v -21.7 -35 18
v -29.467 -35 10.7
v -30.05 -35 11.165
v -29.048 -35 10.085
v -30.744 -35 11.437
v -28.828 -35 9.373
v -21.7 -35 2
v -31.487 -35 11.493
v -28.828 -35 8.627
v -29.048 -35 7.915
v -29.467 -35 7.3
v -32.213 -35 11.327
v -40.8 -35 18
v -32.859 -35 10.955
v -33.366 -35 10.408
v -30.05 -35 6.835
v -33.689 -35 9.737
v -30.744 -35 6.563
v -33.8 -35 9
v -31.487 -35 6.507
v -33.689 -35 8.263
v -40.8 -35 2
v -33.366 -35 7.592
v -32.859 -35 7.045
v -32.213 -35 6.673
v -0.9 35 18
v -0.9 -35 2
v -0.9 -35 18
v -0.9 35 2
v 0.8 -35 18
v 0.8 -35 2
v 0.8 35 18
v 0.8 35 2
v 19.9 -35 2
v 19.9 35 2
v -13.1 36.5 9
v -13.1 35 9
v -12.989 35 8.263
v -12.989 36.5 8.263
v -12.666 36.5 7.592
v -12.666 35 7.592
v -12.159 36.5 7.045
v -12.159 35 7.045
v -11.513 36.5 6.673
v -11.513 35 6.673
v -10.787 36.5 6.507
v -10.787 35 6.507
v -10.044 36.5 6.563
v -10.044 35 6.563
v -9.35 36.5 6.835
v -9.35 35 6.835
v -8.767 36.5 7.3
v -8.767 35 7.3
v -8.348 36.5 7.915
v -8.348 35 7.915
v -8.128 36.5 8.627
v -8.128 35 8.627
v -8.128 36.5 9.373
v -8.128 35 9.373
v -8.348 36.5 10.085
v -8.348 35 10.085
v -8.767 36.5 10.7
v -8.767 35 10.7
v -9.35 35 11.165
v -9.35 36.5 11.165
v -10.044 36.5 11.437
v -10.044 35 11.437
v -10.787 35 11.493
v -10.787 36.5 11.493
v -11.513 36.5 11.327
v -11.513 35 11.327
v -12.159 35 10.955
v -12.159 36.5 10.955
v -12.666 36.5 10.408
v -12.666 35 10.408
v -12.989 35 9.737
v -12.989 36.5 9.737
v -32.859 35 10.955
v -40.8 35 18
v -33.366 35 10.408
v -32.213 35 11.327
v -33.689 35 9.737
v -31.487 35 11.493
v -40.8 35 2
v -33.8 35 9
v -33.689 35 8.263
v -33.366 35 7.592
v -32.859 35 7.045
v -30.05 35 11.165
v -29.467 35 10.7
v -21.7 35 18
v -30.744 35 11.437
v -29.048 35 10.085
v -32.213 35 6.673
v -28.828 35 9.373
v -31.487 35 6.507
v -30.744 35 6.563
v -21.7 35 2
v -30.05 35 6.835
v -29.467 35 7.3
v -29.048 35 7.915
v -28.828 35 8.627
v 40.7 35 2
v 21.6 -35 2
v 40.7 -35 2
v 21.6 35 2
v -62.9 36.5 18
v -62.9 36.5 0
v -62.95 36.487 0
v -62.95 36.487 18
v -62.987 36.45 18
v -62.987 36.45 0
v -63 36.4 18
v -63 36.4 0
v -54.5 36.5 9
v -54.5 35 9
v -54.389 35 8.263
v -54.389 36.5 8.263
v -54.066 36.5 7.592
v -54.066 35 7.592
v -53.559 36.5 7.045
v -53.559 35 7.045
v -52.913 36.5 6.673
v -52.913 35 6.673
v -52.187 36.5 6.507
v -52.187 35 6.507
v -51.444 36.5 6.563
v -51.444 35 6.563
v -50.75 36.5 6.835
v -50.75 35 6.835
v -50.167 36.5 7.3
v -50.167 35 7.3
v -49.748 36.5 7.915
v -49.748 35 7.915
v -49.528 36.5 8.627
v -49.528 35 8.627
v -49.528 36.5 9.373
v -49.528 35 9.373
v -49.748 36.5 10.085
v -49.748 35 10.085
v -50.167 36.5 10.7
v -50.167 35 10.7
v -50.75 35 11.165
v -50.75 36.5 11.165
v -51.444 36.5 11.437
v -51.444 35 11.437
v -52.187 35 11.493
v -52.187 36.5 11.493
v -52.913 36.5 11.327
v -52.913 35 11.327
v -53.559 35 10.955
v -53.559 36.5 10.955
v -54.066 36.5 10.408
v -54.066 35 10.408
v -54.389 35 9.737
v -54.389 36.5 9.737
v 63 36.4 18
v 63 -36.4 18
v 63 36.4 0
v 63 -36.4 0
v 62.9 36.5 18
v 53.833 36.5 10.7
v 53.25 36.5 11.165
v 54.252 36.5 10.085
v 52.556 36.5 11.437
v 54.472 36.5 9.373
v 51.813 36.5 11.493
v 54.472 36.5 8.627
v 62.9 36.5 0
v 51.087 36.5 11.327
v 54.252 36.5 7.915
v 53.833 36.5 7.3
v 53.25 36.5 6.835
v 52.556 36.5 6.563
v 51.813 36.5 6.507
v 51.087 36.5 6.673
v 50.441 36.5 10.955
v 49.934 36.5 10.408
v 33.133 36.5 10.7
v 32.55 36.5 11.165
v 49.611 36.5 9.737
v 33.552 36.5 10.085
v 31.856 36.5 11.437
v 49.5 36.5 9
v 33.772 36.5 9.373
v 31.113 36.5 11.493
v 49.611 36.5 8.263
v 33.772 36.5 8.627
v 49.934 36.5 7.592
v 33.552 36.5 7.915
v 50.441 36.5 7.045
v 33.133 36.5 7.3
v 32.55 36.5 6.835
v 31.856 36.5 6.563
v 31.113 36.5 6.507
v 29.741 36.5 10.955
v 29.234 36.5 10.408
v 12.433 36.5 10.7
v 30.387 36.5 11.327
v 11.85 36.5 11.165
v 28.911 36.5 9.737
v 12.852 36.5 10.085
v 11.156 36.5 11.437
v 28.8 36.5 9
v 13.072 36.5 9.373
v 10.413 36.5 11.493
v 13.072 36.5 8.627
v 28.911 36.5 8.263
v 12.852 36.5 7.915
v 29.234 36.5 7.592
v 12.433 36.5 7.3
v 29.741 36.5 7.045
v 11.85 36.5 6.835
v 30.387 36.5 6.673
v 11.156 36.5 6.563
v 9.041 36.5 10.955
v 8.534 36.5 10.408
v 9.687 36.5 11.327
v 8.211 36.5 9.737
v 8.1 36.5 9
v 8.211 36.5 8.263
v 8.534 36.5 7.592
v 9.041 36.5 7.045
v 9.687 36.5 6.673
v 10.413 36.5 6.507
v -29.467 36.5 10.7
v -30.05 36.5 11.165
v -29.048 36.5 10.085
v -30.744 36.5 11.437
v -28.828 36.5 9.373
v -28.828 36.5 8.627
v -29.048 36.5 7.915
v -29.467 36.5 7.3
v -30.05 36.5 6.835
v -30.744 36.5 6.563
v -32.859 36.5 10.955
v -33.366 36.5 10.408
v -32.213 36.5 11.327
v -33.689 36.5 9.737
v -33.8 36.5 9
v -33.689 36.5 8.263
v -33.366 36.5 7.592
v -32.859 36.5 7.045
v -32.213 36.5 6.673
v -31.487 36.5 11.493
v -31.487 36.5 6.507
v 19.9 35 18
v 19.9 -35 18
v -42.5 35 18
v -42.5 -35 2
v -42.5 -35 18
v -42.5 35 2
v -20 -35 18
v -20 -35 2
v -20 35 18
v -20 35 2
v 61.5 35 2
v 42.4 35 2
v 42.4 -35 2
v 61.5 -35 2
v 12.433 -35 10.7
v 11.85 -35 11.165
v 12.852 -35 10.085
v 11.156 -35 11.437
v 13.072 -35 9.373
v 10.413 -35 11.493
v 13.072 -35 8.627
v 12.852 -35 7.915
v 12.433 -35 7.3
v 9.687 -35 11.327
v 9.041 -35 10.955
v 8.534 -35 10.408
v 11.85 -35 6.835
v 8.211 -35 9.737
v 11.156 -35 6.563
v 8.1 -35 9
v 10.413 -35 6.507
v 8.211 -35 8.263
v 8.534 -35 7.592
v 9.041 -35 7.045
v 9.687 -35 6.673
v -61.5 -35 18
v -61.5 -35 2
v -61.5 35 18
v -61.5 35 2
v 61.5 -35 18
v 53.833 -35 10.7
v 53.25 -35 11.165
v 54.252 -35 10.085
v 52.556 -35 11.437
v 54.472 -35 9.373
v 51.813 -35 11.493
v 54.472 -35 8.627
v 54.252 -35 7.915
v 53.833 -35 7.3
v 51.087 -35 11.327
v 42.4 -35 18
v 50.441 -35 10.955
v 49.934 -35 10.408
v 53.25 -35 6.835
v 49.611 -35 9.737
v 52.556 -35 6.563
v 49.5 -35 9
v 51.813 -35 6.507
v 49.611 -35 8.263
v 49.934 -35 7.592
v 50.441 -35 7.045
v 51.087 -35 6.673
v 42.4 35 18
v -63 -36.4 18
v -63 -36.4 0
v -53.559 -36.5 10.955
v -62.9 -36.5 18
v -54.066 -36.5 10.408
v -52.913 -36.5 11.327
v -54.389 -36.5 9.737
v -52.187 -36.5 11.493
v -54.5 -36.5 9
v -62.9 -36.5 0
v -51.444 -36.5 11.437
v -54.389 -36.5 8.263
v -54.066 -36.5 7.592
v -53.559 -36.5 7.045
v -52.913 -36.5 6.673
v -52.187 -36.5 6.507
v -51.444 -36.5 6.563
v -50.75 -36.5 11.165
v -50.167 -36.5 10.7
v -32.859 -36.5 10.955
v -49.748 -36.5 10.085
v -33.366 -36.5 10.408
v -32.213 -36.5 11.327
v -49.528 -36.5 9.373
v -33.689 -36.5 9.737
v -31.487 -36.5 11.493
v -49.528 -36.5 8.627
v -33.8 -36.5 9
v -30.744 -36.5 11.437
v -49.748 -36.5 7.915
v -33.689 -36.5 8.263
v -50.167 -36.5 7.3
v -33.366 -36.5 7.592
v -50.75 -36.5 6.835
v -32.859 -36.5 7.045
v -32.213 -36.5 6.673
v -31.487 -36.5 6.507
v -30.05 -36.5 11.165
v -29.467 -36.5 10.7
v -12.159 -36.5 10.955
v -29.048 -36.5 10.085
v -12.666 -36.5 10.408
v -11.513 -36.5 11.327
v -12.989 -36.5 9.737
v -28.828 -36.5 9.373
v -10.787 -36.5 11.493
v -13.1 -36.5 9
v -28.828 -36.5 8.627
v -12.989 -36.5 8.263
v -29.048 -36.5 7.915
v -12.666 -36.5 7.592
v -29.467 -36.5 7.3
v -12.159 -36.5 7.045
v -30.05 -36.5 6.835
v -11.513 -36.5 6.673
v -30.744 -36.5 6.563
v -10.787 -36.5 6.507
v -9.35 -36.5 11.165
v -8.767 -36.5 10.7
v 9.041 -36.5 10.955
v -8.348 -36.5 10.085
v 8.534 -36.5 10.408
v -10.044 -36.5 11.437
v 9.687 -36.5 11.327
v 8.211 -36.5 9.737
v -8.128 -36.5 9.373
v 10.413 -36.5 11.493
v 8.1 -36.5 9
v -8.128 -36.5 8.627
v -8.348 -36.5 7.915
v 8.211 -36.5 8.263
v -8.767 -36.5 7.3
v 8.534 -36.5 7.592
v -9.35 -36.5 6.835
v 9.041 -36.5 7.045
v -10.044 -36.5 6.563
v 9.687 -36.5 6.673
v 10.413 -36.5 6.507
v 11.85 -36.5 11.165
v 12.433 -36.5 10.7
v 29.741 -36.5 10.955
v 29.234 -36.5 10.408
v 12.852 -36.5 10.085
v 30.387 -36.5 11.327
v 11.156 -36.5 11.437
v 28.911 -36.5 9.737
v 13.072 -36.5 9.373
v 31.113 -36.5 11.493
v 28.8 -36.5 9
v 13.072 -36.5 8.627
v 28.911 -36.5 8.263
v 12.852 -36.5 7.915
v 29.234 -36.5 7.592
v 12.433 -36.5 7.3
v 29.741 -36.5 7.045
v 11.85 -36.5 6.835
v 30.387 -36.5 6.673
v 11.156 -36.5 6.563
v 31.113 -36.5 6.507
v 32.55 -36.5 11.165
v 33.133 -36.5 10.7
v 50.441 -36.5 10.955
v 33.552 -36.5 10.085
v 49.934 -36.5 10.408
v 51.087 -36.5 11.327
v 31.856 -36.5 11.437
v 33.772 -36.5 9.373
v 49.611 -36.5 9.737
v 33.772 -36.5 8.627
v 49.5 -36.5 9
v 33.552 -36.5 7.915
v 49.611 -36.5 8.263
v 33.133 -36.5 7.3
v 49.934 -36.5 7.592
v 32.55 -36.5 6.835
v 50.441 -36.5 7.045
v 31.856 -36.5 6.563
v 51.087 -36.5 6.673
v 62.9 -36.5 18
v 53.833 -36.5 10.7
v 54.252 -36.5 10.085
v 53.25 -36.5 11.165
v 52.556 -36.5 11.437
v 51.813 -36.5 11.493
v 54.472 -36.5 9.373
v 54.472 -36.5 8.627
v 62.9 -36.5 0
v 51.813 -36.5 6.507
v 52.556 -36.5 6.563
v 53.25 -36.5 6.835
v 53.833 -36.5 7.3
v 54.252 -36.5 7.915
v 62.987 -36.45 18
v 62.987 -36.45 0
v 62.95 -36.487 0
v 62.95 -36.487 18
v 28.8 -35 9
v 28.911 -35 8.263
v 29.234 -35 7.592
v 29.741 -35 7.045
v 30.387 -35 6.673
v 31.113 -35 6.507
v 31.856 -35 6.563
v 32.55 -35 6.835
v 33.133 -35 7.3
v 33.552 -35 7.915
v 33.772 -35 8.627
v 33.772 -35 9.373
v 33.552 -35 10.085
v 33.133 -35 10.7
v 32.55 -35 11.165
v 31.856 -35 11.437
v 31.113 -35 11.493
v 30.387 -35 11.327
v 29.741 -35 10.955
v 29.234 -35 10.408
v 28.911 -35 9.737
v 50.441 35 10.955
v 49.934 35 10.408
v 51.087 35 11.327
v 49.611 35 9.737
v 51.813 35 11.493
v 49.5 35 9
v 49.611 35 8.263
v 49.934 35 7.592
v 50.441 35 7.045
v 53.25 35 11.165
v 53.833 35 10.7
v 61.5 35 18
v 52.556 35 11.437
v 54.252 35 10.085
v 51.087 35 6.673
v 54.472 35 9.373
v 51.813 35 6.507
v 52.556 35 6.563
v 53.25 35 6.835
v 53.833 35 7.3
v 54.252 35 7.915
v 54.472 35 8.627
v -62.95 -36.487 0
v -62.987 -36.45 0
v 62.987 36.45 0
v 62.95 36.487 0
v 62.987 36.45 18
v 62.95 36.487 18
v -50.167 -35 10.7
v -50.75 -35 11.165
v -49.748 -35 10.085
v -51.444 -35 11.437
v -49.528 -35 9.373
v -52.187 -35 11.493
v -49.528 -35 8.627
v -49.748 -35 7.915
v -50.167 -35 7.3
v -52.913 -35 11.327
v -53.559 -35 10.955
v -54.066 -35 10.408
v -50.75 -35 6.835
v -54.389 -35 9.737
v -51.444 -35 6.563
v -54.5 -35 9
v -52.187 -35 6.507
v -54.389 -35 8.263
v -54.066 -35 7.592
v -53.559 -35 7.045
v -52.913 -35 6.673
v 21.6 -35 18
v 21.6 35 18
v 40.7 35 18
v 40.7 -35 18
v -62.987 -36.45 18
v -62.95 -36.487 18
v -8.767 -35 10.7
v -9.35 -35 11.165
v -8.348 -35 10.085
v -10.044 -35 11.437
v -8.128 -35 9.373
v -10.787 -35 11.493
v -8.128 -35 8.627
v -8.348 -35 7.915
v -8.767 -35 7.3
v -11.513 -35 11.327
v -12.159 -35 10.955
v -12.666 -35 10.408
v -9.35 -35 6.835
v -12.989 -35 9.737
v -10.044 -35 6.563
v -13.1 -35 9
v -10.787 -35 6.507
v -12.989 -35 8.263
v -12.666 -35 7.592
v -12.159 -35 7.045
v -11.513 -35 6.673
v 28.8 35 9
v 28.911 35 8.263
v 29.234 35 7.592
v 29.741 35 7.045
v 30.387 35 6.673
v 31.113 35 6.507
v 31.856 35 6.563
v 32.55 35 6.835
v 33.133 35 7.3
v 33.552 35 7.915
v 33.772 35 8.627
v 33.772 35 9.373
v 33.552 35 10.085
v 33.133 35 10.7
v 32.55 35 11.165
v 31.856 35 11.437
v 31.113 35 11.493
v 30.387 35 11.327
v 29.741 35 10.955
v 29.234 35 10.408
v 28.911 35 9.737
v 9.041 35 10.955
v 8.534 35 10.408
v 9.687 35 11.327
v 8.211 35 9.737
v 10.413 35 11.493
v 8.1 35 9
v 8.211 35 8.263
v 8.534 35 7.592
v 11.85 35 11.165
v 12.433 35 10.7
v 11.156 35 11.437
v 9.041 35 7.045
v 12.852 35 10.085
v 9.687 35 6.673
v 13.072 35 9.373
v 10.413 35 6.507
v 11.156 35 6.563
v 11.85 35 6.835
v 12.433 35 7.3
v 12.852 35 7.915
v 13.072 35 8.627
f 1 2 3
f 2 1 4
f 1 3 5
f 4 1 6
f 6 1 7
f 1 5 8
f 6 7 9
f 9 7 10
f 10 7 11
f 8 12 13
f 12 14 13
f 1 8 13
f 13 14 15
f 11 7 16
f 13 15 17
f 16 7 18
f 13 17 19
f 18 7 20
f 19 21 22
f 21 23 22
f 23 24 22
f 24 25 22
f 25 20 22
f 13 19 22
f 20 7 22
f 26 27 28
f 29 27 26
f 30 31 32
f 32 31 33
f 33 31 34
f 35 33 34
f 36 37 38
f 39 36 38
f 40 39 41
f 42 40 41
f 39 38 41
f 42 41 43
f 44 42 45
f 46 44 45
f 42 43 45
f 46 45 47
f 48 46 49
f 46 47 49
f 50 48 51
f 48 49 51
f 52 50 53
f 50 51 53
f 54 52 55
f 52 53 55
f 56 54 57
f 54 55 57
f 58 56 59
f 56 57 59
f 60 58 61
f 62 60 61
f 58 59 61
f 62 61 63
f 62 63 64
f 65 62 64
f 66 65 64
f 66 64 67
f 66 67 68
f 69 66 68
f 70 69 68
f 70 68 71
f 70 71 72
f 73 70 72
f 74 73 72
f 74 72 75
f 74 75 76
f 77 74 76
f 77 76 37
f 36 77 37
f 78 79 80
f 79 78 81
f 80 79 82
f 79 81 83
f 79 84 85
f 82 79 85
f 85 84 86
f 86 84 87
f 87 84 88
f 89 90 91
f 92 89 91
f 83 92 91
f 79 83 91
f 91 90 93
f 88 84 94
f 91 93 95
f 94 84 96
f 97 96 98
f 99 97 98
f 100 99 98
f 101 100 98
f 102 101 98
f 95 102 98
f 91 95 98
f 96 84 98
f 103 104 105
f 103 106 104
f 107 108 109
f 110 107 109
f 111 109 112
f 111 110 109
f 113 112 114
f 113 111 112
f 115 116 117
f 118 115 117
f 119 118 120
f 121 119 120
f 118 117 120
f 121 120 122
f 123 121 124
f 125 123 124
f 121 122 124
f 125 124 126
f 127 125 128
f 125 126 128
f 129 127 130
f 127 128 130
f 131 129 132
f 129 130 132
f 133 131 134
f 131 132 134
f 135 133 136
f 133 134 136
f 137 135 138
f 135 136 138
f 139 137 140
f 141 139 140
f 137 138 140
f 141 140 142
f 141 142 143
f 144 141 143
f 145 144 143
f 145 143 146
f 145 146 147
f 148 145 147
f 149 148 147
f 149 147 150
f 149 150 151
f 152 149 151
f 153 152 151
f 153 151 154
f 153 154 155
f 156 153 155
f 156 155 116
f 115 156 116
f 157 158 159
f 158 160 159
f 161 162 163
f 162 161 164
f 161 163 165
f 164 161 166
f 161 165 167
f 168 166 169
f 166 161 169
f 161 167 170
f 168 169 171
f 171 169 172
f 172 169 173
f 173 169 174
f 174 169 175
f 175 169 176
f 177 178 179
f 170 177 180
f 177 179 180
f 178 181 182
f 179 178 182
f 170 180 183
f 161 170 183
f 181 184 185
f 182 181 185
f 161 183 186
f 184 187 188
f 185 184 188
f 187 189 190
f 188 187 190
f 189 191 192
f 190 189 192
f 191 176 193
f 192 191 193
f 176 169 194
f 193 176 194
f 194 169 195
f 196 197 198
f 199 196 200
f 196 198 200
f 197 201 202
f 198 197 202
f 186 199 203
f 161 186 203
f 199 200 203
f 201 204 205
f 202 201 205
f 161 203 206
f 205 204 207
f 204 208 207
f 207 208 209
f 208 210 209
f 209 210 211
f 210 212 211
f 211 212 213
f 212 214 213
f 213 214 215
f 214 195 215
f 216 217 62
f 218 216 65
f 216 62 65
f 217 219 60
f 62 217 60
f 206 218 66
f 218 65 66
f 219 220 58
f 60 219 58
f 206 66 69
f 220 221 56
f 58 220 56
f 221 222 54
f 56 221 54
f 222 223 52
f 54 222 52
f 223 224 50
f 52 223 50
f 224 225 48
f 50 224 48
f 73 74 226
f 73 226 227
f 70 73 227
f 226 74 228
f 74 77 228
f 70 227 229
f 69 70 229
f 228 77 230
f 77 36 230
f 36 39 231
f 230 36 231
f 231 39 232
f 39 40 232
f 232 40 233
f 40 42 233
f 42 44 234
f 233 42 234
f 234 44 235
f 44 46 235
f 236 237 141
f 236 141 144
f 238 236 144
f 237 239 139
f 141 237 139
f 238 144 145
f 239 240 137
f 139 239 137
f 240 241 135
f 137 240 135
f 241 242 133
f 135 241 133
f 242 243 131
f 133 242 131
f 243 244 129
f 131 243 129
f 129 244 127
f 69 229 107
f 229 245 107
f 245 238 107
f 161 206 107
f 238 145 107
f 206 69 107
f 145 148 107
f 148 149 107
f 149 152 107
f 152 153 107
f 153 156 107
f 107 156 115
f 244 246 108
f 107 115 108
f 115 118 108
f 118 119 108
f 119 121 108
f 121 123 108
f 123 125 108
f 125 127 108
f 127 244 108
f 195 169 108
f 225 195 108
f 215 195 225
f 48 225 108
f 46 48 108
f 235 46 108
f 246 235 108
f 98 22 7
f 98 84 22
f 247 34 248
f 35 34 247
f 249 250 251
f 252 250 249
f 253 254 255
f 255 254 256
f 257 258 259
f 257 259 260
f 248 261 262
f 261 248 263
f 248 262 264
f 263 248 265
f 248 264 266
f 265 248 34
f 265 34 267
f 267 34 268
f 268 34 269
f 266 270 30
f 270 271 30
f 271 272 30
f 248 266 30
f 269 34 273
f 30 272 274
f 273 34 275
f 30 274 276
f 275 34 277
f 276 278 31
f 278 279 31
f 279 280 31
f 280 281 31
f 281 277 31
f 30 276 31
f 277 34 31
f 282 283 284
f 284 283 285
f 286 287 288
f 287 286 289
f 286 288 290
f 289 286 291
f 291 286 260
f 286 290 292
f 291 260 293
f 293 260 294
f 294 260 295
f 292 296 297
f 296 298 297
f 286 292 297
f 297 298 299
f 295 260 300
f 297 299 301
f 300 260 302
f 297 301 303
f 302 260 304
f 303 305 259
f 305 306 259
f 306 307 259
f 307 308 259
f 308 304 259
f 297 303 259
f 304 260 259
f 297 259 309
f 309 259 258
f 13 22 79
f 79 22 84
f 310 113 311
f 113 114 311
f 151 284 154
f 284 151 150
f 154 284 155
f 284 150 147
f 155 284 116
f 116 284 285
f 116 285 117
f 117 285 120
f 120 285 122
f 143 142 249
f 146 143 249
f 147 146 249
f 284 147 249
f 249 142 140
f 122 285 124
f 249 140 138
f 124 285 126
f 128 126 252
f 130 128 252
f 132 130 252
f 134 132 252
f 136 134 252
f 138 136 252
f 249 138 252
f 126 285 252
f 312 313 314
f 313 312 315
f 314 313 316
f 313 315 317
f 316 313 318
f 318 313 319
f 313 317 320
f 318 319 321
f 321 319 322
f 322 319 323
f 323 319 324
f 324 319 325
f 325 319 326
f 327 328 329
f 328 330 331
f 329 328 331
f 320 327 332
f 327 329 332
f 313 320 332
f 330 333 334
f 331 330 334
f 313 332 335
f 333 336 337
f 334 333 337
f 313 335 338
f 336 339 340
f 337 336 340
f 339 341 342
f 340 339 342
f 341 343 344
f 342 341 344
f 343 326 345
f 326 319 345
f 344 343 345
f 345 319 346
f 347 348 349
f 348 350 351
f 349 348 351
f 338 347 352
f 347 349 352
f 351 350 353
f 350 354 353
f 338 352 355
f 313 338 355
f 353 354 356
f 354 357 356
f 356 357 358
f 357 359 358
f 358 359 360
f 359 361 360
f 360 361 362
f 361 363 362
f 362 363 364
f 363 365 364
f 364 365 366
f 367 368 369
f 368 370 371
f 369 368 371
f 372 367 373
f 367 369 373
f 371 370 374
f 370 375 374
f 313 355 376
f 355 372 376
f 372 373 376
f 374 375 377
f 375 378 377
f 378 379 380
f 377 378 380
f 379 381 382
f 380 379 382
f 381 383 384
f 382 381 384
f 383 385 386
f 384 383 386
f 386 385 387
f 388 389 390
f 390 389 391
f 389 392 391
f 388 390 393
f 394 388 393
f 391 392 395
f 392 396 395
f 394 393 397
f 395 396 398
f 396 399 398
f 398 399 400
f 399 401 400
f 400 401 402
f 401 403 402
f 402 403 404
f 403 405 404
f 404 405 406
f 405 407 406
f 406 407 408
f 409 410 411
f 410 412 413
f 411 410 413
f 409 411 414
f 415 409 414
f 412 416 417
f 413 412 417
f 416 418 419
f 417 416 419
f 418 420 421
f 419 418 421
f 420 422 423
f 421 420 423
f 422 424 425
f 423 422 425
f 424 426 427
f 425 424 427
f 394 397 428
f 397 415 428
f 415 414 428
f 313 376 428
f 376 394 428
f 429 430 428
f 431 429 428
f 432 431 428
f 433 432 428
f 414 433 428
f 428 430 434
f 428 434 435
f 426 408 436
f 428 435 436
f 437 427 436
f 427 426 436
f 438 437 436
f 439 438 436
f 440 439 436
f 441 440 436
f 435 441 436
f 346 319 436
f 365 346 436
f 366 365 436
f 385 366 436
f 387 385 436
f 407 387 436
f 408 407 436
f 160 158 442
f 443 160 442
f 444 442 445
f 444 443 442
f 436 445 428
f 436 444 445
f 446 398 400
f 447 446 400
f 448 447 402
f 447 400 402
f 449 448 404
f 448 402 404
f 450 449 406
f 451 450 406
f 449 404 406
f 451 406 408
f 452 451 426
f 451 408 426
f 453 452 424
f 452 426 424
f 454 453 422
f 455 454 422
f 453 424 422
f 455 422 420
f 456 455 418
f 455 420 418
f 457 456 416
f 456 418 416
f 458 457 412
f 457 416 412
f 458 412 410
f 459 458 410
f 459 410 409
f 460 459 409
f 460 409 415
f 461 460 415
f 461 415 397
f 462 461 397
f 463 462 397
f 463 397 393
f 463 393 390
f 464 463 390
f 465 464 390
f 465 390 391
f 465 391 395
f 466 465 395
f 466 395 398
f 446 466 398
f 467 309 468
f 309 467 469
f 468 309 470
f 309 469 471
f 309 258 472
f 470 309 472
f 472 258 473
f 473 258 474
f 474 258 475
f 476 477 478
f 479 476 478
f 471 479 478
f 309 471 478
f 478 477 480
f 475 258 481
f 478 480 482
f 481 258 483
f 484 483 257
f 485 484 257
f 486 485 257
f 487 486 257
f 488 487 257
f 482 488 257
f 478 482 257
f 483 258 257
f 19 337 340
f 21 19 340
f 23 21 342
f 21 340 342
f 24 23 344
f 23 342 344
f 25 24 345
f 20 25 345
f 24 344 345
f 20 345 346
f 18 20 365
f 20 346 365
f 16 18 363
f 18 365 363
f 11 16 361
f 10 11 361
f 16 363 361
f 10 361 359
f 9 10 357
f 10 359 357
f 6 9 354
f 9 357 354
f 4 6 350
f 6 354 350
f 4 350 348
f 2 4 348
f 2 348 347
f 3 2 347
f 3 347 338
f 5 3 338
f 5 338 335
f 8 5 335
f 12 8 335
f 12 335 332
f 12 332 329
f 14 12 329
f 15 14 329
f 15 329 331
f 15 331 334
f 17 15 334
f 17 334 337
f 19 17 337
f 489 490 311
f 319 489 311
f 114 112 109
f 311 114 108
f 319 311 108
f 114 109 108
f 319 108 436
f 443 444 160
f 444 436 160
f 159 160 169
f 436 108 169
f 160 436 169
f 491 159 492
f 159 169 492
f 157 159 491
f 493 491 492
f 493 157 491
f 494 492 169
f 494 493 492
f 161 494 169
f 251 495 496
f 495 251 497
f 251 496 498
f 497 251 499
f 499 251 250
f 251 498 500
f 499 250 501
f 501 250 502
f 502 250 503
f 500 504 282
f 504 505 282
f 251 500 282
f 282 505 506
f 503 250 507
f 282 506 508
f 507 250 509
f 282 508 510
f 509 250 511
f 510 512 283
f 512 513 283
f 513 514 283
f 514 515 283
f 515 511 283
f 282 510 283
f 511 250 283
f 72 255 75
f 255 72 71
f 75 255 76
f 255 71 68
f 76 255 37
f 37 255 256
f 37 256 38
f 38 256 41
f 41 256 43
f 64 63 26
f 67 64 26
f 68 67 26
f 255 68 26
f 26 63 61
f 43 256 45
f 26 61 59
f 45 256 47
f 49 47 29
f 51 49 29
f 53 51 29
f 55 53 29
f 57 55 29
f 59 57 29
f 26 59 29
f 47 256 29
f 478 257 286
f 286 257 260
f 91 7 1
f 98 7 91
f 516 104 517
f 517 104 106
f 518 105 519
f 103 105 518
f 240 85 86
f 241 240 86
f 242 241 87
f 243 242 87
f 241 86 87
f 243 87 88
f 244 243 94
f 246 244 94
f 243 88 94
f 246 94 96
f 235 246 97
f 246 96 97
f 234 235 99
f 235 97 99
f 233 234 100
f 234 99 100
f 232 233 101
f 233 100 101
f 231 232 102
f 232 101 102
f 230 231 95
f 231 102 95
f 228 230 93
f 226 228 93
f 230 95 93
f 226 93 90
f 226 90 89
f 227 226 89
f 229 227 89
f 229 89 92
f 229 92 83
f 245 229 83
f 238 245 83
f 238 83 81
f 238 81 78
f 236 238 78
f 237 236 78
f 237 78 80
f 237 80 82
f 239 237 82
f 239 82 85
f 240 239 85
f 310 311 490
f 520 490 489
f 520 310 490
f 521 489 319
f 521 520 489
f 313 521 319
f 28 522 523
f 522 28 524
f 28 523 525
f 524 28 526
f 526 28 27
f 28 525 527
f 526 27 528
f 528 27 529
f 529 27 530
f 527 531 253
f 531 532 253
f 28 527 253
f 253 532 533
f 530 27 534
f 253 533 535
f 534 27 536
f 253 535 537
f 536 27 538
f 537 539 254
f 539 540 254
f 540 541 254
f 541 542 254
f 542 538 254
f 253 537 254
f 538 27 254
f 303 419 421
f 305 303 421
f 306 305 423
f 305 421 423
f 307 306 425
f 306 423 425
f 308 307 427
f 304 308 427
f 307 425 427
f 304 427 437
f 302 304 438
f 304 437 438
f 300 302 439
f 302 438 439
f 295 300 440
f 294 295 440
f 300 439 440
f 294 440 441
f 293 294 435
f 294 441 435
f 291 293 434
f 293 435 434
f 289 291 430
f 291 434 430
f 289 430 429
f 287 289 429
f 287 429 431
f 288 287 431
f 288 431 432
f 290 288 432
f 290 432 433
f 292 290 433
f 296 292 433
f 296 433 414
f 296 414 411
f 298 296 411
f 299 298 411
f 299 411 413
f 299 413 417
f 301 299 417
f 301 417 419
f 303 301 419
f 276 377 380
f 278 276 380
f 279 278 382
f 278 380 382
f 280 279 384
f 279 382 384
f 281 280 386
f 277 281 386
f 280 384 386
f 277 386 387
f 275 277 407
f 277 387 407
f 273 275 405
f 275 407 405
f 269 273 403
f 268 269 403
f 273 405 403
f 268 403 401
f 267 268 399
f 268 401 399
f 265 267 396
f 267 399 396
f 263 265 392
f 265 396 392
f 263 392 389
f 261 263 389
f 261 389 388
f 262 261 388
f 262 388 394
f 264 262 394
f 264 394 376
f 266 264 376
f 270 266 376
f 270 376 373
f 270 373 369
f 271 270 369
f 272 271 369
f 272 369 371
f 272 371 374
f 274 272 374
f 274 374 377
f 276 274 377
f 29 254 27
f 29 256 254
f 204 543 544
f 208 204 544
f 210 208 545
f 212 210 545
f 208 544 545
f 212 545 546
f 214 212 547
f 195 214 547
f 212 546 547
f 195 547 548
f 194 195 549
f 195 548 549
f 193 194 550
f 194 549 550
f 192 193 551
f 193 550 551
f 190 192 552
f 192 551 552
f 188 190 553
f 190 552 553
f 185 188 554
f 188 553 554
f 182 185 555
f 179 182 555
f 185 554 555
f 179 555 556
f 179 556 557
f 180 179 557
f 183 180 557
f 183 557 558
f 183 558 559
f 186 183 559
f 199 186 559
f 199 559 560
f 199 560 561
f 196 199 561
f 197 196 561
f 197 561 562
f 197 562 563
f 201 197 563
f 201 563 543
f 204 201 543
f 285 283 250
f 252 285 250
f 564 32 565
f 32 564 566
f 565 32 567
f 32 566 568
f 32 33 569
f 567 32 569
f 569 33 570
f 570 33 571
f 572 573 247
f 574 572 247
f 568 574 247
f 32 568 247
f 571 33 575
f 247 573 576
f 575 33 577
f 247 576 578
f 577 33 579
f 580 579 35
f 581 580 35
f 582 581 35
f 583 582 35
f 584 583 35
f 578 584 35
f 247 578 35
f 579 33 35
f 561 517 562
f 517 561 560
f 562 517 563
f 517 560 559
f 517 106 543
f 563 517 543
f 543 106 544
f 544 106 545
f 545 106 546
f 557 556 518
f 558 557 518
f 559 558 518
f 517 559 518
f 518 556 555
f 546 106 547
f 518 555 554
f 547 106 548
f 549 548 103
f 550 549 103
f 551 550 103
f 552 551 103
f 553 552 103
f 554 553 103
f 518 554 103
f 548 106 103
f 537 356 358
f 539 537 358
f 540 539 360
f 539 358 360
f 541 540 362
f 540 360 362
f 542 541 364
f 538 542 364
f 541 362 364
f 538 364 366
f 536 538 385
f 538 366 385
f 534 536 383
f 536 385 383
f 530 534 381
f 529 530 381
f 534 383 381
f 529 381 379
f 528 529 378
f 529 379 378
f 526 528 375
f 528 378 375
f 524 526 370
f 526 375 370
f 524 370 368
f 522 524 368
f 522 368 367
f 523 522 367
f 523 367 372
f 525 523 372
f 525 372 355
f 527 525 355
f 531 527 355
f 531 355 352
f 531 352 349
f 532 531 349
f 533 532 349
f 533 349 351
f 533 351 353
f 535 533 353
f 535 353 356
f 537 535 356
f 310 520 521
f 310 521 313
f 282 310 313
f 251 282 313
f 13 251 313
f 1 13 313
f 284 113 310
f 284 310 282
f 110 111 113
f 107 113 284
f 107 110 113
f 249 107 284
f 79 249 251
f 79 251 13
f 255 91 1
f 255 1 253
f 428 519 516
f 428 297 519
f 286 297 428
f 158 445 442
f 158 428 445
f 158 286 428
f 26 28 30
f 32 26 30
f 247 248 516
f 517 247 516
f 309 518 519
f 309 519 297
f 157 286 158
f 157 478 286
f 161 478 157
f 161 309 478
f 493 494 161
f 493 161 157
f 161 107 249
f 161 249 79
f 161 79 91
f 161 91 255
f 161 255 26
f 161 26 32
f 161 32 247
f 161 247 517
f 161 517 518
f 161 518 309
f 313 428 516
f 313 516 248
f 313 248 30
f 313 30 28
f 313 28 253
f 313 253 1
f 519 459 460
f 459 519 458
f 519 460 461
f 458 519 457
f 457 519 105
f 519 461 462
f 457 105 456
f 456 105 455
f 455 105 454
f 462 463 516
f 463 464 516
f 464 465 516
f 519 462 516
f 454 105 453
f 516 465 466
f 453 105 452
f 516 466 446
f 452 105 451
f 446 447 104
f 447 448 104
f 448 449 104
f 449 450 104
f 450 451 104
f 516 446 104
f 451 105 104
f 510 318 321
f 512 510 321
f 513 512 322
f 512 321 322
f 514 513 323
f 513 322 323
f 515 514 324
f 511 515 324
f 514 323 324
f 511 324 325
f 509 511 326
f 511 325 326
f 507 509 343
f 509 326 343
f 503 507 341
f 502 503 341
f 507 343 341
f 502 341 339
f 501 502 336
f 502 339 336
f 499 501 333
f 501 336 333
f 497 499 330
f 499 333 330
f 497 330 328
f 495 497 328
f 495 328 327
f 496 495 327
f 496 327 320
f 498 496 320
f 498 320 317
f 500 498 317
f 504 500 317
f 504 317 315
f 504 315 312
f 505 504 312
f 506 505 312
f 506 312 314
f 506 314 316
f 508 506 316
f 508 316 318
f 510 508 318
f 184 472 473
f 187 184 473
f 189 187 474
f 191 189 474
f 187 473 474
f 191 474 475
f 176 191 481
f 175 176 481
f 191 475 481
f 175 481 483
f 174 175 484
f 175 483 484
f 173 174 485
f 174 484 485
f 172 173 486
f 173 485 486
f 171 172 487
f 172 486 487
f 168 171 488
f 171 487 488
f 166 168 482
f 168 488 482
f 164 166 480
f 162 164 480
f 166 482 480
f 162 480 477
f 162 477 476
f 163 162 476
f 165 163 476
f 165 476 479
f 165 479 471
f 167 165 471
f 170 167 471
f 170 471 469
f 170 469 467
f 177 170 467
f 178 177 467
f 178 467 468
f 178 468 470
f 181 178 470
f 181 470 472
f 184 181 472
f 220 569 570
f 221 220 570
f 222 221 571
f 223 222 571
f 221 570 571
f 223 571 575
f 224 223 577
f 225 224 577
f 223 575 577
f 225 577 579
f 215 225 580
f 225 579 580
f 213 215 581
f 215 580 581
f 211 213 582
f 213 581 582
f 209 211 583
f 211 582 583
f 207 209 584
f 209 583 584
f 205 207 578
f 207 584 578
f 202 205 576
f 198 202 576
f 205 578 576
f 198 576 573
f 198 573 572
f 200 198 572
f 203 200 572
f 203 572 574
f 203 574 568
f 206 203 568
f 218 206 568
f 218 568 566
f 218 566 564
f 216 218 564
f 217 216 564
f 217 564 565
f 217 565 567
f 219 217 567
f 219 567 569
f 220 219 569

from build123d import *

# Parameters (mm, degrees)
F0_W     = 126
F0_H     = 73
F1_DEPTH = 2
F2_W     = 1.7
F2_H     = 1.5
F2_W_2   = 19.1
F2_H_2   = 70
F3_DEPTH = 16
F5_DEPTH = 100
F6_R     = 0.1


with BuildPart() as f1:
    # F0 (on Top) → F1 (new body)
    with BuildSketch(Plane.XY):
        Rectangle(F0_W, F0_H)
    extrude(amount=F1_DEPTH)

    # F2 (on face) → F3 (join)
    with BuildSketch(Plane.XY.offset(2)):
        Polygon((42.4, 35), (61.5, 35), (61.5, -35), (42.4, -35), (42.4, -36.5), (63, -36.5), (63, 36.5), (42.4, 36.5), align=None)
        with Locations((41.55, 35.75)):
            Rectangle(F2_W, F2_H)
        with Locations((31.15, 35.75)):
            Rectangle(F2_W_2, F2_H)
        with Locations((41.55, -35.75)):
            Rectangle(F2_W, F2_H)
        with Locations((20.75, 35.75)):
            Rectangle(F2_W, F2_H)
        with Locations((31.15, -35.75)):
            Rectangle(F2_W_2, F2_H)
        with Locations((10.35, 35.75)):
            Rectangle(F2_W_2, F2_H)
        with Locations((20.75, -35.75)):
            Rectangle(F2_W, F2_H)
        with Locations((-0.05, 35.75)):
            Rectangle(F2_W, F2_H)
        with Locations((10.35, -35.75)):
            Rectangle(F2_W_2, F2_H)
        with Locations((-10.45, 35.75)):
            Rectangle(F2_W_2, F2_H)
        with Locations((-0.05, -35.75)):
            Rectangle(F2_W, F2_H)
        with Locations((-20.85, 35.75)):
            Rectangle(F2_W, F2_H)
        with Locations((-10.45, -35.75)):
            Rectangle(F2_W_2, F2_H)
        with Locations((-31.25, 35.75)):
            Rectangle(F2_W_2, F2_H)
        with Locations((-20.85, -35.75)):
            Rectangle(F2_W, F2_H)
        with Locations((-41.65, 35.75)):
            Rectangle(F2_W, F2_H)
        with Locations((-31.25, -35.75)):
            Rectangle(F2_W_2, F2_H)
        Polygon((-61.5, 35), (-42.5, 35), (-42.5, 36.5), (-63, 36.5), (-63, -36.5), (-42.5, -36.5), (-42.5, -35), (-61.5, -35), align=None)
        with Locations((-41.65, -35.75)):
            Rectangle(F2_W, F2_H)
        with Locations((-41.65, 0)):
            Rectangle(F2_W, F2_H_2)
        with Locations((-20.85, 0)):
            Rectangle(F2_W, F2_H_2)
        with Locations((-0.05, 0)):
            Rectangle(F2_W, F2_H_2)
        with Locations((20.75, 0)):
            Rectangle(F2_W, F2_H_2)
        with Locations((41.55, 0)):
            Rectangle(F2_W, F2_H_2)
    extrude(amount=F3_DEPTH)

    # F4 (on face) → F5 (cut)
    with BuildSketch(Plane.XZ.offset(36.5)):
        with BuildLine():
            ThreePointArc((-49.5, 9), (-52, 11.5), (-54.5, 9))
            Line((-54.5, 9), (-49.5, 9))
        make_face()
        with BuildLine():
            ThreePointArc((54.5, 9), (52, 11.5), (49.5, 9))
            Line((49.5, 9), (54.5, 9))
        make_face()
        with BuildLine():
            Line((54.5, 9), (49.5, 9))
            ThreePointArc((49.5, 9), (52, 6.5), (54.5, 9))
        make_face()
        with BuildLine():
            ThreePointArc((33.8, 9), (31.3, 11.5), (28.8, 9))
            Line((28.8, 9), (33.8, 9))
        make_face()
        with BuildLine():
            Line((33.8, 9), (28.8, 9))
            ThreePointArc((28.8, 9), (31.3, 6.5), (33.8, 9))
        make_face()
        with BuildLine():
            ThreePointArc((13.1, 9), (10.6, 11.5), (8.1, 9))
            Line((8.1, 9), (13.1, 9))
        make_face()
        with BuildLine():
            Line((13.1, 9), (8.1, 9))
            ThreePointArc((8.1, 9), (10.6, 6.5), (13.1, 9))
        make_face()
        with BuildLine():
            ThreePointArc((-8.1, 9), (-10.6, 11.5), (-13.1, 9))
            Line((-13.1, 9), (-8.1, 9))
        make_face()
        with BuildLine():
            Line((-8.1, 9), (-13.1, 9))
            ThreePointArc((-13.1, 9), (-10.6, 6.5), (-8.1, 9))
        make_face()
        with BuildLine():
            ThreePointArc((-28.8, 9), (-31.3, 11.5), (-33.8, 9))
            Line((-33.8, 9), (-28.8, 9))
        make_face()
        with BuildLine():
            Line((-28.8, 9), (-33.8, 9))
            ThreePointArc((-33.8, 9), (-31.3, 6.5), (-28.8, 9))
        make_face()
        with BuildLine():
            Line((-49.5, 9), (-54.5, 9))
            ThreePointArc((-54.5, 9), (-52, 6.5), (-49.5, 9))
        make_face()
    extrude(amount=-F5_DEPTH, mode=Mode.SUBTRACT)

    # F6
    f6_edges = [f1.edges().sort_by_distance(p)[0] for p in [
        (-63, -36.5, 9),
        (63, -36.5, 9),
        (63, 36.5, 9),
        (-63, 36.5, 9),
    ]]
    fillet(f6_edges, radius=F6_R)


solid = f1.part
